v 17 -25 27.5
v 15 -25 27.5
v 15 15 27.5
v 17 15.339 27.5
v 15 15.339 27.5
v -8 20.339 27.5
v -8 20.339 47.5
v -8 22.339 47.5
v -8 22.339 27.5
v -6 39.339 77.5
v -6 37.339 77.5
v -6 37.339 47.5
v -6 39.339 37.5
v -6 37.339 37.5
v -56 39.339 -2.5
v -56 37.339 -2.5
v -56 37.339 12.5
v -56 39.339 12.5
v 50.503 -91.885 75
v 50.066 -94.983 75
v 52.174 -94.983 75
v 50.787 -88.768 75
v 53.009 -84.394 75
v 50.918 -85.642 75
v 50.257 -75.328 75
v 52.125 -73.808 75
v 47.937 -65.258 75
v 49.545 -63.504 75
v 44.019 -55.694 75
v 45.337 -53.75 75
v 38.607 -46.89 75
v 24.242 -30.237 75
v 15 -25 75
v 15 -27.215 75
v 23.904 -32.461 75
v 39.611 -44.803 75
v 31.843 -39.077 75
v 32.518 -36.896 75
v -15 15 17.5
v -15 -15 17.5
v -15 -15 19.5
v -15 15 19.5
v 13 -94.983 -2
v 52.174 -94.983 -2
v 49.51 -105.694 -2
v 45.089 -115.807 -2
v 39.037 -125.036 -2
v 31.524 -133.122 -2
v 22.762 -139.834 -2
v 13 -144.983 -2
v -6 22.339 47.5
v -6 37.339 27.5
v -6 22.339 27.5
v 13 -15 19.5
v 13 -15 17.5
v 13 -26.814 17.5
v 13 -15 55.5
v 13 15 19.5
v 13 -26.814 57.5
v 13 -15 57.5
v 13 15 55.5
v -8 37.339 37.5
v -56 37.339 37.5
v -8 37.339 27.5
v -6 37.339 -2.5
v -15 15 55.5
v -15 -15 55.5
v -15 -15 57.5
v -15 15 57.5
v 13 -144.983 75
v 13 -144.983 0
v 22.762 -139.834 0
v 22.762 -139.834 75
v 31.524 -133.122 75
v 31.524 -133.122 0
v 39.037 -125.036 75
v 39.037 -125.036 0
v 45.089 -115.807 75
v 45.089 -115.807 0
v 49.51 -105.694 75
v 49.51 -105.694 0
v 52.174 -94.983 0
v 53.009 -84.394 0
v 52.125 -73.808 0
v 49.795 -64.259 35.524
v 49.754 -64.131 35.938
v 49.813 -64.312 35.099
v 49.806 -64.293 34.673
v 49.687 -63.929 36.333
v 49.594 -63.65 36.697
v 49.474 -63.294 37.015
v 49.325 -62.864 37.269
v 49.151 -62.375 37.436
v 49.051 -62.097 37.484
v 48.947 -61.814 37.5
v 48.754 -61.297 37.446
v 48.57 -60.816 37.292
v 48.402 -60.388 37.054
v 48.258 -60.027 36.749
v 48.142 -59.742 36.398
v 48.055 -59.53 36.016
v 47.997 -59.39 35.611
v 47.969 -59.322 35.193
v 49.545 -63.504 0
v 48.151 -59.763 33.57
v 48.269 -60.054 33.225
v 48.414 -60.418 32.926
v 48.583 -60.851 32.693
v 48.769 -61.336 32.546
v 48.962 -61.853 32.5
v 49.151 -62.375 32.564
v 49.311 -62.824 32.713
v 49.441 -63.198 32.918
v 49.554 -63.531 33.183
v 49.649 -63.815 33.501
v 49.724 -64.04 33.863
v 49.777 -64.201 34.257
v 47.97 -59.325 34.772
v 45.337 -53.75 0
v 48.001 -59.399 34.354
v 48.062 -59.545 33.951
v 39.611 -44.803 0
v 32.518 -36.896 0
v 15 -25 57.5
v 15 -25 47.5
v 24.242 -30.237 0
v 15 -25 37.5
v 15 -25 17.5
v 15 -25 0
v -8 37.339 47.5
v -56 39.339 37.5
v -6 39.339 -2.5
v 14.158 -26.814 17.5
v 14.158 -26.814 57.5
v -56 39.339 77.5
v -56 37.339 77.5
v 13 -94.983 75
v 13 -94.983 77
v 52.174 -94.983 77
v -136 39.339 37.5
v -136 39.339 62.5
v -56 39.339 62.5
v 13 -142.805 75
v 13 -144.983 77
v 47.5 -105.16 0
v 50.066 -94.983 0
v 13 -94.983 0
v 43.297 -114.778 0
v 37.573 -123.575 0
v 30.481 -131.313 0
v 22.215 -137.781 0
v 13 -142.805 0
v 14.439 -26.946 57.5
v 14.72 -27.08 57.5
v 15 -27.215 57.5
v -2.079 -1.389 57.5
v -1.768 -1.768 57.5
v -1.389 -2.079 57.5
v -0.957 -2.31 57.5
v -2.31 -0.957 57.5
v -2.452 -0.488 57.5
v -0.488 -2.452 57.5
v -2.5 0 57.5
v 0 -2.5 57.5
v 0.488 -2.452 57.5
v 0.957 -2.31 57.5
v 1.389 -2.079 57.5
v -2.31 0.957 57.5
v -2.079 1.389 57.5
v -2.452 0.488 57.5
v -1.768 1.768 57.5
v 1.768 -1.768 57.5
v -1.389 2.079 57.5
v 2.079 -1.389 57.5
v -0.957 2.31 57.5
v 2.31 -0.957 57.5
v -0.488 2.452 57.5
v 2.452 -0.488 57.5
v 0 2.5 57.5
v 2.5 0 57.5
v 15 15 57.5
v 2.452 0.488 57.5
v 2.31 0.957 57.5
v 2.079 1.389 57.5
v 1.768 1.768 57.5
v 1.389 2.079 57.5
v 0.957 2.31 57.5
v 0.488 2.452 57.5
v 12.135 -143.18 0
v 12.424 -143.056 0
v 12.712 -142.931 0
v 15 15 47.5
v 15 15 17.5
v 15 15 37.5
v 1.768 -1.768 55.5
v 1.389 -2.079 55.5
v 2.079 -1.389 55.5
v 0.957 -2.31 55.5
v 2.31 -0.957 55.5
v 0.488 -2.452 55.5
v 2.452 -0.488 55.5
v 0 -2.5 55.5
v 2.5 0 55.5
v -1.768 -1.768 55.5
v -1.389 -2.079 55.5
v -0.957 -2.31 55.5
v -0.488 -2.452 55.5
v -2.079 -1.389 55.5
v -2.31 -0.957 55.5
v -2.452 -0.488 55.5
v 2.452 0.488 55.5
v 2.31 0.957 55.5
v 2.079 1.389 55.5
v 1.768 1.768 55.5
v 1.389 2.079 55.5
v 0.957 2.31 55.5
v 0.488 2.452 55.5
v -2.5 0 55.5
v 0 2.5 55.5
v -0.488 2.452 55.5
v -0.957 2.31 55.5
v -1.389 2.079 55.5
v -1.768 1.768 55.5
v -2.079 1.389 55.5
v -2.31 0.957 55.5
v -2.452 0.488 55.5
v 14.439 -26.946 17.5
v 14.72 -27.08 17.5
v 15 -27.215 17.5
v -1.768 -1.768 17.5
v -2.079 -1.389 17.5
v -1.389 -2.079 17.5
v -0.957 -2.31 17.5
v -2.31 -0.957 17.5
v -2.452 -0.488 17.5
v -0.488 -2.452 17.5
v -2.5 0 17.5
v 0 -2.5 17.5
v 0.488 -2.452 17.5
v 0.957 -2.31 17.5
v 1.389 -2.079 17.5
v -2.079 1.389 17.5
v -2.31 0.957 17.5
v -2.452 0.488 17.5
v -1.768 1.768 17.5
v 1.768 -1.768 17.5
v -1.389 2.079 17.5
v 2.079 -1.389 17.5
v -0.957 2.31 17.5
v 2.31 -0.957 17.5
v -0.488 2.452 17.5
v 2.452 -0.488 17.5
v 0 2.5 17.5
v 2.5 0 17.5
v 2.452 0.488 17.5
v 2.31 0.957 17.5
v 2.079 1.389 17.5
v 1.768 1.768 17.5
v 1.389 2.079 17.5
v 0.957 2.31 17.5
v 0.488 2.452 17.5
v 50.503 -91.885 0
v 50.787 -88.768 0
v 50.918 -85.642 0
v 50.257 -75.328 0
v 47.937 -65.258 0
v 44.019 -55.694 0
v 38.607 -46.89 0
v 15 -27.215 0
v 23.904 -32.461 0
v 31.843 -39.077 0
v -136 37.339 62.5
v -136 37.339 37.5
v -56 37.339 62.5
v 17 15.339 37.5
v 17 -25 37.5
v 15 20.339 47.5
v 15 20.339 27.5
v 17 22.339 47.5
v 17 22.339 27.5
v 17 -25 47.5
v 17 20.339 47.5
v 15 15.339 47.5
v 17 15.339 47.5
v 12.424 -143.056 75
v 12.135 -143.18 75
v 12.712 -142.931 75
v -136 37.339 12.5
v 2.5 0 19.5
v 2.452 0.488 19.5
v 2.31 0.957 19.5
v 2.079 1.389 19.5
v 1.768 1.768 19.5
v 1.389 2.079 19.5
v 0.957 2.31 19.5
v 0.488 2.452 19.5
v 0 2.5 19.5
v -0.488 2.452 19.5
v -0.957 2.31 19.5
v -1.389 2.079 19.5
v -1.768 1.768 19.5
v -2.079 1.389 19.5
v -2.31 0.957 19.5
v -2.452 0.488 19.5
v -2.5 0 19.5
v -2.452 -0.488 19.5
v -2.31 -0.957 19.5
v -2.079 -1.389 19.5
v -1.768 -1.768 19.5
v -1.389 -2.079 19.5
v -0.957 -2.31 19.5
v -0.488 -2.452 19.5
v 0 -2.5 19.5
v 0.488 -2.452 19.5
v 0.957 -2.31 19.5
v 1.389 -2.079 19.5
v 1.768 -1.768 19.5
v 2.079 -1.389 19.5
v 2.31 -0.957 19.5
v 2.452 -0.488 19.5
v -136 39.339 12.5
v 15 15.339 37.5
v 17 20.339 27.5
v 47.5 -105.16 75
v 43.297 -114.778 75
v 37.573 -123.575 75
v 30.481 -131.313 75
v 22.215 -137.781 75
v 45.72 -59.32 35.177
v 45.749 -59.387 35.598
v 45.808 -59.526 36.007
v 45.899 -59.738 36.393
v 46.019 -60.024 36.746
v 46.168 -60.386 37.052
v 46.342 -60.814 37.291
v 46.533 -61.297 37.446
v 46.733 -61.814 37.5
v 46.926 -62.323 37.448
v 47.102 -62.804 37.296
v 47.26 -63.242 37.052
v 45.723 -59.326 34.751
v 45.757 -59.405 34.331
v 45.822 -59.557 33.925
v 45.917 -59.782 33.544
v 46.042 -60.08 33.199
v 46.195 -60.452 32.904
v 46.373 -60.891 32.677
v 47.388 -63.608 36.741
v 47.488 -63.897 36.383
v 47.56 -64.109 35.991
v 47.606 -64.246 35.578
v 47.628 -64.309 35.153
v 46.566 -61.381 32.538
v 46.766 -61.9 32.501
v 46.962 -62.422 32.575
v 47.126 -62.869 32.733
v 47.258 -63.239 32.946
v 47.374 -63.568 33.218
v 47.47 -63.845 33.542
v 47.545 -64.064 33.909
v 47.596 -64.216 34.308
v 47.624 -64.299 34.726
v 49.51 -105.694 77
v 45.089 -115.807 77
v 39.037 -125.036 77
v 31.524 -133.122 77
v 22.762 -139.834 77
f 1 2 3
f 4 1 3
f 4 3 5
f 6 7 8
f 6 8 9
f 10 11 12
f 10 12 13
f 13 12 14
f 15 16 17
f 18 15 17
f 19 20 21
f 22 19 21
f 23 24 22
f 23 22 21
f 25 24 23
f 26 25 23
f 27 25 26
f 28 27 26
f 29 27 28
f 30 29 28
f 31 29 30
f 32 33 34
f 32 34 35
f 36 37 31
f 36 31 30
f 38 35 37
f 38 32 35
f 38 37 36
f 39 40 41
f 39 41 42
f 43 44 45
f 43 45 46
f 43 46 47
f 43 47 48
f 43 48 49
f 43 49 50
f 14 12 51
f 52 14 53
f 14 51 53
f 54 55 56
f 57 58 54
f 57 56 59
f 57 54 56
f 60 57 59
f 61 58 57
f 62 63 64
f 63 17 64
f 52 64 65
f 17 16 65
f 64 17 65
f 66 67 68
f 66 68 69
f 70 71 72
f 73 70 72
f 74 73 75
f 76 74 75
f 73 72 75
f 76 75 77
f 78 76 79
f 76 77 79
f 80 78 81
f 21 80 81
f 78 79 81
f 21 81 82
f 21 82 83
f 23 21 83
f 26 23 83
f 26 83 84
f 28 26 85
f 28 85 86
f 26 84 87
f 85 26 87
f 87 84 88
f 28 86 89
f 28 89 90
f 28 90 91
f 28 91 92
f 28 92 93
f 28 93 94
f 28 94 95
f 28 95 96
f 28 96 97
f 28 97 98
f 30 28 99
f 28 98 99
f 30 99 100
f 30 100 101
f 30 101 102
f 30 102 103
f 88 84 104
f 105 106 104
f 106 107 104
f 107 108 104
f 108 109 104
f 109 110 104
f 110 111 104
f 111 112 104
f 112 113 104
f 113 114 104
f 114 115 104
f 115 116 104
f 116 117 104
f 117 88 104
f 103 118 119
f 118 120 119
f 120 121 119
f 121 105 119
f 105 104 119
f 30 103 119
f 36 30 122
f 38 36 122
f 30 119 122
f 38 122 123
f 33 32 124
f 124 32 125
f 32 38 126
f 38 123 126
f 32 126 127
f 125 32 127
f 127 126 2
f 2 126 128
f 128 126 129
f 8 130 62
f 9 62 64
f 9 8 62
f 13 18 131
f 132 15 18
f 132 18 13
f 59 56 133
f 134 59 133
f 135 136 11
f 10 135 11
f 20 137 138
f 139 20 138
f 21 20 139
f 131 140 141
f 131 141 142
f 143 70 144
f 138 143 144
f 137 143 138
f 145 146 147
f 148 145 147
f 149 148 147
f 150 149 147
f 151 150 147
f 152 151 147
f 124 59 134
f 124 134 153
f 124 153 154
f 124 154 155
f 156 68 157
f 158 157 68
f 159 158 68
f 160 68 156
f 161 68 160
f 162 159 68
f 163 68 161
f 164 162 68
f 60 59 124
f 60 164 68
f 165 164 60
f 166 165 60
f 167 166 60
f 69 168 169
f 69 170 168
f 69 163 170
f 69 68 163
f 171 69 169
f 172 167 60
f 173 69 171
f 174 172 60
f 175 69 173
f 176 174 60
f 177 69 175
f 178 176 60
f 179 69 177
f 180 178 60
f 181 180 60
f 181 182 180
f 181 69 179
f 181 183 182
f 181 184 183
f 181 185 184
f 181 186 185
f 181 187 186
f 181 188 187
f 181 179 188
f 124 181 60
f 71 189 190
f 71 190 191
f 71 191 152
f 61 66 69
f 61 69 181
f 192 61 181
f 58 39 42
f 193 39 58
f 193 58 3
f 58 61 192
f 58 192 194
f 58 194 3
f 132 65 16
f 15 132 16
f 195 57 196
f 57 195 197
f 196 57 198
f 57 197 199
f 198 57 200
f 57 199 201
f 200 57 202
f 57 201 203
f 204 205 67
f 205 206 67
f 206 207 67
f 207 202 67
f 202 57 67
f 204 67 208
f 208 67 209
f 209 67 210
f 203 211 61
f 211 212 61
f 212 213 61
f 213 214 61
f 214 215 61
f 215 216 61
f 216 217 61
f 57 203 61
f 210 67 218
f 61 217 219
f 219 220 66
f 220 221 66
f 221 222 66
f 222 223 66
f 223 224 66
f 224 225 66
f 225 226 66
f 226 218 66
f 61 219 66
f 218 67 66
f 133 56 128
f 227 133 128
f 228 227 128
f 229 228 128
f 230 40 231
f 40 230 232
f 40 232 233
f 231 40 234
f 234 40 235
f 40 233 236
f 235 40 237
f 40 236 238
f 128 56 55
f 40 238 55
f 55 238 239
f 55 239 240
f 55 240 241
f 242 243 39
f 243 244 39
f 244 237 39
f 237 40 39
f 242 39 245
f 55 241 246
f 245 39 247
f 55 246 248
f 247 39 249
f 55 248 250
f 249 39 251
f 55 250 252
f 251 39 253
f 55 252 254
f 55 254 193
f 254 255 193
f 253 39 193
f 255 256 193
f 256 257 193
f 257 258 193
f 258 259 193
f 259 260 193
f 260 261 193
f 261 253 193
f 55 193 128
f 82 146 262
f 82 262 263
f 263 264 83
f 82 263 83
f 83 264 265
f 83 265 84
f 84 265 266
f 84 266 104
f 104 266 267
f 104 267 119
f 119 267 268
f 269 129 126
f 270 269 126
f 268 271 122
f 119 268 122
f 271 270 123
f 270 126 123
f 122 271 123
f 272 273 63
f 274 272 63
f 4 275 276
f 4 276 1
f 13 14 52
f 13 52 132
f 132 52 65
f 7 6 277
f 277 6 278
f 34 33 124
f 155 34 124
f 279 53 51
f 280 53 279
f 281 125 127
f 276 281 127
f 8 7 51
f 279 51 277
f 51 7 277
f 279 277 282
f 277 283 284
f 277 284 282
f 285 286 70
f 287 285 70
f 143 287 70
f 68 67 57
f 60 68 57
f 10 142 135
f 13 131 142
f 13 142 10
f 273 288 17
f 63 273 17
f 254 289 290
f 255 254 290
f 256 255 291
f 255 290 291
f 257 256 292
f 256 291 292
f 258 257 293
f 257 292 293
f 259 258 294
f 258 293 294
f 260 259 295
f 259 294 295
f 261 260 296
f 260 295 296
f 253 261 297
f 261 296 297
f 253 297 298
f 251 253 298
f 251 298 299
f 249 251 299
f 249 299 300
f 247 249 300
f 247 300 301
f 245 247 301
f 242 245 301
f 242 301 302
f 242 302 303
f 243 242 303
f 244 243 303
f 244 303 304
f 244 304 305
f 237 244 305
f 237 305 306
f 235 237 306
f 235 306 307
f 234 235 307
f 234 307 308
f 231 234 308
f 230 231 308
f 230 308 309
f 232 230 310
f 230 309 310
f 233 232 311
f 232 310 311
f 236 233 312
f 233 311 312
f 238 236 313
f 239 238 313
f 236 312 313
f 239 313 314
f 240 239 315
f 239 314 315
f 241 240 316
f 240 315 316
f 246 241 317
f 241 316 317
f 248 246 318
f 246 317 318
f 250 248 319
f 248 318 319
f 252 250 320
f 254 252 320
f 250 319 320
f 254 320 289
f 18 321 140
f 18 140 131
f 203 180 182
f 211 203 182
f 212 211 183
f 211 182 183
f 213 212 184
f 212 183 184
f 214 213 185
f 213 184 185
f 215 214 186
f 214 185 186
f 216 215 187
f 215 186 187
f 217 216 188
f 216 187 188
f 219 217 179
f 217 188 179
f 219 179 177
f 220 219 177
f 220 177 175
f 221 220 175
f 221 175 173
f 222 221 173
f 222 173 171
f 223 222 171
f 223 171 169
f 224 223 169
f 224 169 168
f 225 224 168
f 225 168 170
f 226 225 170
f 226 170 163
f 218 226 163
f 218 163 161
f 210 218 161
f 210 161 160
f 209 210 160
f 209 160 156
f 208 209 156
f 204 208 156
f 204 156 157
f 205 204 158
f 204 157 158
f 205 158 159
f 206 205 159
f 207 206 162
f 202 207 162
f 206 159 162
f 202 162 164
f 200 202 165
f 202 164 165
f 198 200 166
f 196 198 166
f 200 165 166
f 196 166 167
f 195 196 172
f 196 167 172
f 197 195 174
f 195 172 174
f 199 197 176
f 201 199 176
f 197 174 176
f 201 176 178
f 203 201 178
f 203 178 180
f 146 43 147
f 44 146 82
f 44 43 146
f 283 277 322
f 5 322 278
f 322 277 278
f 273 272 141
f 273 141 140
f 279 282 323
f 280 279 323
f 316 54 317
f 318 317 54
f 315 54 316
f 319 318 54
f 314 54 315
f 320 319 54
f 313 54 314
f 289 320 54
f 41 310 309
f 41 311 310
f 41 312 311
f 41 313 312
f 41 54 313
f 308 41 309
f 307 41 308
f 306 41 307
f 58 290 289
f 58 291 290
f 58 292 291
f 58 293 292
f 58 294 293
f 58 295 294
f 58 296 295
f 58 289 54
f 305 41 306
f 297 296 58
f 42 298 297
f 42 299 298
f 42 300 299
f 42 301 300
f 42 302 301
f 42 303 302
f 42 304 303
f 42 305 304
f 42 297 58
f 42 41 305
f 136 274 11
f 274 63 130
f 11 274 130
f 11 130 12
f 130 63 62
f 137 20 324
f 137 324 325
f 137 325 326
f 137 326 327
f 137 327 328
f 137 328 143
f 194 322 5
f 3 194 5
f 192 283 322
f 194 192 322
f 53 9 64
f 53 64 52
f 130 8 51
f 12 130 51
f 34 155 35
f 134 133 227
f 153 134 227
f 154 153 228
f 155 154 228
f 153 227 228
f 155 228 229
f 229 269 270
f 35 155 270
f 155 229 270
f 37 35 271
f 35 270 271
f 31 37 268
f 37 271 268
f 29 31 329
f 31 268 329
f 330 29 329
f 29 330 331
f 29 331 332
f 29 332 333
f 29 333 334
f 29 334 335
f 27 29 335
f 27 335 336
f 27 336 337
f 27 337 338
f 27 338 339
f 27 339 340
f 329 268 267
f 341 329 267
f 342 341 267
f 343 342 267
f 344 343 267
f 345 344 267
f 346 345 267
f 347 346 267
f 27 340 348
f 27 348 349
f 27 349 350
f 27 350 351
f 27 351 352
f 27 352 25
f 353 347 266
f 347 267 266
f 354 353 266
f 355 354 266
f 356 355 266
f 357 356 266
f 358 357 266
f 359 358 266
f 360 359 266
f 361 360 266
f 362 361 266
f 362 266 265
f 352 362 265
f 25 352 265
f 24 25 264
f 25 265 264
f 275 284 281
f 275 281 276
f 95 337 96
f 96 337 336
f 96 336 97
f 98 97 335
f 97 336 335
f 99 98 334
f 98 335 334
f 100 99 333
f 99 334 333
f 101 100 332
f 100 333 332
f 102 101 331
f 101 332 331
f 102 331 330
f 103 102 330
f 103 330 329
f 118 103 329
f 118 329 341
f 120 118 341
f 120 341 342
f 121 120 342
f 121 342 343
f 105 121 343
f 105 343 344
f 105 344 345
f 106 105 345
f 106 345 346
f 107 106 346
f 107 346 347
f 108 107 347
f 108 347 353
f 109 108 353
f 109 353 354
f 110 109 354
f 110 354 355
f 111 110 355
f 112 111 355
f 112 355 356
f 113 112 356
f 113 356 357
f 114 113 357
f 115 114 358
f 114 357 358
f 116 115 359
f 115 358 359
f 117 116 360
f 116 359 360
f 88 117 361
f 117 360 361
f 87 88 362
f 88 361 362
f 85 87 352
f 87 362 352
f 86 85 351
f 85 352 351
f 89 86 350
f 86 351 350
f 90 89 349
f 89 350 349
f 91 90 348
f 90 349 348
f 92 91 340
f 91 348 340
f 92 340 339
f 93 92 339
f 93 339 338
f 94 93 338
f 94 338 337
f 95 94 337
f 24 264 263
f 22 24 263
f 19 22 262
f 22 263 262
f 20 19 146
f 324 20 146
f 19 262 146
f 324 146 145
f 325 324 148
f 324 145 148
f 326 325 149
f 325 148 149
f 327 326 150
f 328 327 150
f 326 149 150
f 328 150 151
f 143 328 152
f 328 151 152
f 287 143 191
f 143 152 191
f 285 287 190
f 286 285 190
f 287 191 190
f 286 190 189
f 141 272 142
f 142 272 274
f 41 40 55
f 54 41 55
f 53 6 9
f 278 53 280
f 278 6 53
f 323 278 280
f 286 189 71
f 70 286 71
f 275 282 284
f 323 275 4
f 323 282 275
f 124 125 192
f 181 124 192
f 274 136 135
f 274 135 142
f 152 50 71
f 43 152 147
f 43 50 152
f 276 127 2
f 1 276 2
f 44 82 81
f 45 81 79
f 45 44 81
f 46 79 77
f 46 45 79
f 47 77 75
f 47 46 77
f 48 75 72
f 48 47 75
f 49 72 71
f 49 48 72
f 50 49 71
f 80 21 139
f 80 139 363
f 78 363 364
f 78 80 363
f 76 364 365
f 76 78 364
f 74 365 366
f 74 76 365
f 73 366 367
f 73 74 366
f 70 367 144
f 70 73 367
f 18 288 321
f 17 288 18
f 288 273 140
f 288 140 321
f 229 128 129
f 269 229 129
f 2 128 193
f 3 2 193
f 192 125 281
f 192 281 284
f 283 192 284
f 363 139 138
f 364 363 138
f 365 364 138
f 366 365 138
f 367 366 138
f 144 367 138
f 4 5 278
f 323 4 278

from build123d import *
from build123d.topology import SkipClean

# Parameters (mm, degrees)
SKETCH1_W           = 30
SKETCH1_H           = 30
SKETCH1_W_2         = 2
SKETCH1_H_2         = 10
BOSS_EXTRUDE1_DEPTH = 75
SKETCH2_W           = 30
SKETCH2_H           = 17.5
CUT_EXTRUDE1_DEPTH  = 75
SKETCH3_W           = 36
SKETCH3_H           = 30.162749864
CUT_EXTRUDE2_DEPTH  = 28
SKETCH5_R           = 2.5
CUT_EXTRUDE3_DEPTH  = 50
BOSS_EXTRUDE2_DEPTH = 2
BOSS_EXTRUDE3_START = 2
BOSS_EXTRUDE3_DEPTH = 2
SKETCH9_R           = 2.5
CUT_EXTRUDE4_DEPTH  = 169.967145294
SKETCH11_W          = 10
SKETCH11_H          = 40.338772632
SKETCH11_W_2        = 20
SKETCH11_H_2        = 5
BOSS_EXTRUDE4_DEPTH = 2
SKETCH13_W          = 25
SKETCH13_H          = 20
BOSS_EXTRUDE5_DEPTH = 2
SKETCH15_W          = 2
SKETCH15_H          = 20
BOSS_EXTRUDE6_DEPTH = 15
SKETCH16_W          = 80
SKETCH16_H          = 25
BOSS_EXTRUDE8_DEPTH = 2


with BuildPart() as part:
    # Sketch1 → Boss-Extrude1 (new body)
    with BuildSketch(Plane.XY):
        Rectangle(SKETCH1_W, SKETCH1_H)
        with BuildLine():
            Line((50.917737084, -85.641756384), (53, -85.641756384))
            ThreePointArc((53, -85.641756384), (42.989370072, -49.687860894), (15, -25))
            Line((15, -25), (14.157929479, -26.814088542))
            ThreePointArc((14.157929479, -26.814088542), (41.246515654, -50.786104008), (50.917737084, -85.641756384))
        make_face()
        with Locations((14, -20)):
            Rectangle(SKETCH1_W_2, SKETCH1_H_2)
        Polygon((14.157929479, -26.814088542), (15, -25), (13, -25), (13, -26.814088542), align=None)
        with BuildLine():
            Line((12.135037198, -143.180046466), (13, -144.983332176))
            ThreePointArc((13, -144.983332176), (41.796634815, -121.242036174), (53, -85.641756384))
            Line((53, -85.641756384), (50.917737084, -85.641756384))
            ThreePointArc((50.917737084, -85.641756384), (40.047121172, -120.154156399), (12.135037198, -143.180046466))
        make_face()
    extrude(amount=BOSS_EXTRUDE1_DEPTH)

    # Sketch2 → Cut-Extrude1 (cut)
    with BuildSketch(Plane(origin=(0, 15, 0), x_dir=(1, 0, 0), z_dir=(0, 1, 0))):
        with Locations((0, -8.75)):
            Rectangle(SKETCH2_W, SKETCH2_H)
        with Locations((0, -66.25)):
            Rectangle(SKETCH2_W, SKETCH2_H)
    extrude(amount=-CUT_EXTRUDE1_DEPTH, mode=Mode.SUBTRACT)

    # Sketch3 → Cut-Extrude2 (cut)
    with BuildSketch(Plane.ZY.offset(15)):
        with Locations((37.5, 0.030332794)):
            Rectangle(SKETCH3_W, SKETCH3_H)
    extrude(amount=-CUT_EXTRUDE2_DEPTH, mode=Mode.SUBTRACT)

    # Sketch5 → Cut-Extrude3 (cut)
    with BuildSketch(Plane.XY.offset(57.5)):
        Circle(SKETCH5_R)
    extrude(amount=-CUT_EXTRUDE3_DEPTH, mode=Mode.SUBTRACT)

    # Sketch6 → Boss-Extrude2 (add)
    with SkipClean():  # the faces are left unmerged after this step: merging them gives an invalid solid
        with BuildSketch(Plane.XY.offset(75)):
            with BuildLine():
                Line((13, -144.983332176), (13, -94.983332176))
                Line((13, -94.983332176), (52.174379027, -94.983332176))
                ThreePointArc((52.174379027, -94.983332176), (39.036739849, -125.036474764), (13, -144.983332176))
            make_face()
        extrude(amount=BOSS_EXTRUDE2_DEPTH)

    # Sketch7 → Boss-Extrude3 (add)
    with SkipClean():  # the faces are left unmerged after this step: merging them gives an invalid solid
        with BuildSketch(Plane(origin=(0, 0, 0), x_dir=(-1, 0, 0), z_dir=(0, 0, -1)).offset(BOSS_EXTRUDE3_START)):
            with BuildLine():
                Line((-13, -144.983332176), (-13, -94.983332176))
                Line((-13, -94.983332176), (-52.174379027, -94.983332176))
                ThreePointArc((-52.174379027, -94.983332176), (-39.036739849, -125.036474764), (-13, -144.983332176))
            make_face()
        extrude(amount=-BOSS_EXTRUDE3_DEPTH)

    # Sketch9 → Cut-Extrude4 (cut, through all)
    with SkipClean():  # the faces are left unmerged after this step: merging them gives an invalid solid
        with BuildSketch(Plane.ZY.offset(-13)):
            with Locations((35, -61.814088542)):
                Circle(SKETCH9_R)
        extrude(amount=-CUT_EXTRUDE4_DEPTH, mode=Mode.SUBTRACT)

    # Sketch11 → Boss-Extrude4 (add)
    with SkipClean():  # the faces are left unmerged after this step: merging them gives an invalid solid
        with BuildSketch(Plane(origin=(15, 0, 0), x_dir=(0, 0, -1), z_dir=(1, 0, 0))):
            with Locations((-42.5, -4.830613684)):
                Rectangle(SKETCH11_W, SKETCH11_H)
            with Locations((-32.5, -4.830613684)):
                Rectangle(SKETCH11_W, SKETCH11_H)
            with Locations((-37.5, 17.838772632)):
                Rectangle(SKETCH11_W_2, SKETCH11_H_2)
        extrude(amount=BOSS_EXTRUDE4_DEPTH)

    # Sketch13 → Boss-Extrude5 (add)
    with SkipClean():  # the faces are left unmerged after this step: merging them gives an invalid solid
        with BuildSketch(Plane(origin=(0, 20.338772632, 0), x_dir=(1, 0, 0), z_dir=(0, 1, 0))):
            with Locations((4.5, -37.5)):
                Rectangle(SKETCH13_W, SKETCH13_H)
        extrude(amount=BOSS_EXTRUDE5_DEPTH)

    # Sketch15 → Boss-Extrude6 (add)
    with SkipClean():  # the faces are left unmerged after this step: merging them gives an invalid solid
        with BuildSketch(Plane(origin=(0, 22.338772632, 0), x_dir=(1, 0, 0), z_dir=(0, 1, 0))):
            with Locations((-7, -37.5)):
                Rectangle(SKETCH15_W, SKETCH15_H)
        extrude(amount=BOSS_EXTRUDE6_DEPTH)

    # Sketch16 → Boss-Extrude8 (add)
    with SkipClean():  # the faces are left unmerged after this step: merging them gives an invalid solid
        with BuildSketch(Plane(origin=(0, 37.338772632, 0), x_dir=(1, 0, 0), z_dir=(0, 1, 0))):
            with Locations((-96, -50)):
                Rectangle(SKETCH16_W, SKETCH16_H)
            with Locations((-96, -25)):
                Rectangle(SKETCH16_W, SKETCH16_H)
            Polygon((-6, -77.5), (-6, -37.5), (-56, -37.5), (-56, -62.5), (-56, -77.5), align=None)
            Polygon((-56, -37.5), (-6, -37.5), (-6, 2.5), (-56, 2.5), (-56, -12.5), align=None)
        extrude(amount=BOSS_EXTRUDE8_DEPTH)


solid = part.part
